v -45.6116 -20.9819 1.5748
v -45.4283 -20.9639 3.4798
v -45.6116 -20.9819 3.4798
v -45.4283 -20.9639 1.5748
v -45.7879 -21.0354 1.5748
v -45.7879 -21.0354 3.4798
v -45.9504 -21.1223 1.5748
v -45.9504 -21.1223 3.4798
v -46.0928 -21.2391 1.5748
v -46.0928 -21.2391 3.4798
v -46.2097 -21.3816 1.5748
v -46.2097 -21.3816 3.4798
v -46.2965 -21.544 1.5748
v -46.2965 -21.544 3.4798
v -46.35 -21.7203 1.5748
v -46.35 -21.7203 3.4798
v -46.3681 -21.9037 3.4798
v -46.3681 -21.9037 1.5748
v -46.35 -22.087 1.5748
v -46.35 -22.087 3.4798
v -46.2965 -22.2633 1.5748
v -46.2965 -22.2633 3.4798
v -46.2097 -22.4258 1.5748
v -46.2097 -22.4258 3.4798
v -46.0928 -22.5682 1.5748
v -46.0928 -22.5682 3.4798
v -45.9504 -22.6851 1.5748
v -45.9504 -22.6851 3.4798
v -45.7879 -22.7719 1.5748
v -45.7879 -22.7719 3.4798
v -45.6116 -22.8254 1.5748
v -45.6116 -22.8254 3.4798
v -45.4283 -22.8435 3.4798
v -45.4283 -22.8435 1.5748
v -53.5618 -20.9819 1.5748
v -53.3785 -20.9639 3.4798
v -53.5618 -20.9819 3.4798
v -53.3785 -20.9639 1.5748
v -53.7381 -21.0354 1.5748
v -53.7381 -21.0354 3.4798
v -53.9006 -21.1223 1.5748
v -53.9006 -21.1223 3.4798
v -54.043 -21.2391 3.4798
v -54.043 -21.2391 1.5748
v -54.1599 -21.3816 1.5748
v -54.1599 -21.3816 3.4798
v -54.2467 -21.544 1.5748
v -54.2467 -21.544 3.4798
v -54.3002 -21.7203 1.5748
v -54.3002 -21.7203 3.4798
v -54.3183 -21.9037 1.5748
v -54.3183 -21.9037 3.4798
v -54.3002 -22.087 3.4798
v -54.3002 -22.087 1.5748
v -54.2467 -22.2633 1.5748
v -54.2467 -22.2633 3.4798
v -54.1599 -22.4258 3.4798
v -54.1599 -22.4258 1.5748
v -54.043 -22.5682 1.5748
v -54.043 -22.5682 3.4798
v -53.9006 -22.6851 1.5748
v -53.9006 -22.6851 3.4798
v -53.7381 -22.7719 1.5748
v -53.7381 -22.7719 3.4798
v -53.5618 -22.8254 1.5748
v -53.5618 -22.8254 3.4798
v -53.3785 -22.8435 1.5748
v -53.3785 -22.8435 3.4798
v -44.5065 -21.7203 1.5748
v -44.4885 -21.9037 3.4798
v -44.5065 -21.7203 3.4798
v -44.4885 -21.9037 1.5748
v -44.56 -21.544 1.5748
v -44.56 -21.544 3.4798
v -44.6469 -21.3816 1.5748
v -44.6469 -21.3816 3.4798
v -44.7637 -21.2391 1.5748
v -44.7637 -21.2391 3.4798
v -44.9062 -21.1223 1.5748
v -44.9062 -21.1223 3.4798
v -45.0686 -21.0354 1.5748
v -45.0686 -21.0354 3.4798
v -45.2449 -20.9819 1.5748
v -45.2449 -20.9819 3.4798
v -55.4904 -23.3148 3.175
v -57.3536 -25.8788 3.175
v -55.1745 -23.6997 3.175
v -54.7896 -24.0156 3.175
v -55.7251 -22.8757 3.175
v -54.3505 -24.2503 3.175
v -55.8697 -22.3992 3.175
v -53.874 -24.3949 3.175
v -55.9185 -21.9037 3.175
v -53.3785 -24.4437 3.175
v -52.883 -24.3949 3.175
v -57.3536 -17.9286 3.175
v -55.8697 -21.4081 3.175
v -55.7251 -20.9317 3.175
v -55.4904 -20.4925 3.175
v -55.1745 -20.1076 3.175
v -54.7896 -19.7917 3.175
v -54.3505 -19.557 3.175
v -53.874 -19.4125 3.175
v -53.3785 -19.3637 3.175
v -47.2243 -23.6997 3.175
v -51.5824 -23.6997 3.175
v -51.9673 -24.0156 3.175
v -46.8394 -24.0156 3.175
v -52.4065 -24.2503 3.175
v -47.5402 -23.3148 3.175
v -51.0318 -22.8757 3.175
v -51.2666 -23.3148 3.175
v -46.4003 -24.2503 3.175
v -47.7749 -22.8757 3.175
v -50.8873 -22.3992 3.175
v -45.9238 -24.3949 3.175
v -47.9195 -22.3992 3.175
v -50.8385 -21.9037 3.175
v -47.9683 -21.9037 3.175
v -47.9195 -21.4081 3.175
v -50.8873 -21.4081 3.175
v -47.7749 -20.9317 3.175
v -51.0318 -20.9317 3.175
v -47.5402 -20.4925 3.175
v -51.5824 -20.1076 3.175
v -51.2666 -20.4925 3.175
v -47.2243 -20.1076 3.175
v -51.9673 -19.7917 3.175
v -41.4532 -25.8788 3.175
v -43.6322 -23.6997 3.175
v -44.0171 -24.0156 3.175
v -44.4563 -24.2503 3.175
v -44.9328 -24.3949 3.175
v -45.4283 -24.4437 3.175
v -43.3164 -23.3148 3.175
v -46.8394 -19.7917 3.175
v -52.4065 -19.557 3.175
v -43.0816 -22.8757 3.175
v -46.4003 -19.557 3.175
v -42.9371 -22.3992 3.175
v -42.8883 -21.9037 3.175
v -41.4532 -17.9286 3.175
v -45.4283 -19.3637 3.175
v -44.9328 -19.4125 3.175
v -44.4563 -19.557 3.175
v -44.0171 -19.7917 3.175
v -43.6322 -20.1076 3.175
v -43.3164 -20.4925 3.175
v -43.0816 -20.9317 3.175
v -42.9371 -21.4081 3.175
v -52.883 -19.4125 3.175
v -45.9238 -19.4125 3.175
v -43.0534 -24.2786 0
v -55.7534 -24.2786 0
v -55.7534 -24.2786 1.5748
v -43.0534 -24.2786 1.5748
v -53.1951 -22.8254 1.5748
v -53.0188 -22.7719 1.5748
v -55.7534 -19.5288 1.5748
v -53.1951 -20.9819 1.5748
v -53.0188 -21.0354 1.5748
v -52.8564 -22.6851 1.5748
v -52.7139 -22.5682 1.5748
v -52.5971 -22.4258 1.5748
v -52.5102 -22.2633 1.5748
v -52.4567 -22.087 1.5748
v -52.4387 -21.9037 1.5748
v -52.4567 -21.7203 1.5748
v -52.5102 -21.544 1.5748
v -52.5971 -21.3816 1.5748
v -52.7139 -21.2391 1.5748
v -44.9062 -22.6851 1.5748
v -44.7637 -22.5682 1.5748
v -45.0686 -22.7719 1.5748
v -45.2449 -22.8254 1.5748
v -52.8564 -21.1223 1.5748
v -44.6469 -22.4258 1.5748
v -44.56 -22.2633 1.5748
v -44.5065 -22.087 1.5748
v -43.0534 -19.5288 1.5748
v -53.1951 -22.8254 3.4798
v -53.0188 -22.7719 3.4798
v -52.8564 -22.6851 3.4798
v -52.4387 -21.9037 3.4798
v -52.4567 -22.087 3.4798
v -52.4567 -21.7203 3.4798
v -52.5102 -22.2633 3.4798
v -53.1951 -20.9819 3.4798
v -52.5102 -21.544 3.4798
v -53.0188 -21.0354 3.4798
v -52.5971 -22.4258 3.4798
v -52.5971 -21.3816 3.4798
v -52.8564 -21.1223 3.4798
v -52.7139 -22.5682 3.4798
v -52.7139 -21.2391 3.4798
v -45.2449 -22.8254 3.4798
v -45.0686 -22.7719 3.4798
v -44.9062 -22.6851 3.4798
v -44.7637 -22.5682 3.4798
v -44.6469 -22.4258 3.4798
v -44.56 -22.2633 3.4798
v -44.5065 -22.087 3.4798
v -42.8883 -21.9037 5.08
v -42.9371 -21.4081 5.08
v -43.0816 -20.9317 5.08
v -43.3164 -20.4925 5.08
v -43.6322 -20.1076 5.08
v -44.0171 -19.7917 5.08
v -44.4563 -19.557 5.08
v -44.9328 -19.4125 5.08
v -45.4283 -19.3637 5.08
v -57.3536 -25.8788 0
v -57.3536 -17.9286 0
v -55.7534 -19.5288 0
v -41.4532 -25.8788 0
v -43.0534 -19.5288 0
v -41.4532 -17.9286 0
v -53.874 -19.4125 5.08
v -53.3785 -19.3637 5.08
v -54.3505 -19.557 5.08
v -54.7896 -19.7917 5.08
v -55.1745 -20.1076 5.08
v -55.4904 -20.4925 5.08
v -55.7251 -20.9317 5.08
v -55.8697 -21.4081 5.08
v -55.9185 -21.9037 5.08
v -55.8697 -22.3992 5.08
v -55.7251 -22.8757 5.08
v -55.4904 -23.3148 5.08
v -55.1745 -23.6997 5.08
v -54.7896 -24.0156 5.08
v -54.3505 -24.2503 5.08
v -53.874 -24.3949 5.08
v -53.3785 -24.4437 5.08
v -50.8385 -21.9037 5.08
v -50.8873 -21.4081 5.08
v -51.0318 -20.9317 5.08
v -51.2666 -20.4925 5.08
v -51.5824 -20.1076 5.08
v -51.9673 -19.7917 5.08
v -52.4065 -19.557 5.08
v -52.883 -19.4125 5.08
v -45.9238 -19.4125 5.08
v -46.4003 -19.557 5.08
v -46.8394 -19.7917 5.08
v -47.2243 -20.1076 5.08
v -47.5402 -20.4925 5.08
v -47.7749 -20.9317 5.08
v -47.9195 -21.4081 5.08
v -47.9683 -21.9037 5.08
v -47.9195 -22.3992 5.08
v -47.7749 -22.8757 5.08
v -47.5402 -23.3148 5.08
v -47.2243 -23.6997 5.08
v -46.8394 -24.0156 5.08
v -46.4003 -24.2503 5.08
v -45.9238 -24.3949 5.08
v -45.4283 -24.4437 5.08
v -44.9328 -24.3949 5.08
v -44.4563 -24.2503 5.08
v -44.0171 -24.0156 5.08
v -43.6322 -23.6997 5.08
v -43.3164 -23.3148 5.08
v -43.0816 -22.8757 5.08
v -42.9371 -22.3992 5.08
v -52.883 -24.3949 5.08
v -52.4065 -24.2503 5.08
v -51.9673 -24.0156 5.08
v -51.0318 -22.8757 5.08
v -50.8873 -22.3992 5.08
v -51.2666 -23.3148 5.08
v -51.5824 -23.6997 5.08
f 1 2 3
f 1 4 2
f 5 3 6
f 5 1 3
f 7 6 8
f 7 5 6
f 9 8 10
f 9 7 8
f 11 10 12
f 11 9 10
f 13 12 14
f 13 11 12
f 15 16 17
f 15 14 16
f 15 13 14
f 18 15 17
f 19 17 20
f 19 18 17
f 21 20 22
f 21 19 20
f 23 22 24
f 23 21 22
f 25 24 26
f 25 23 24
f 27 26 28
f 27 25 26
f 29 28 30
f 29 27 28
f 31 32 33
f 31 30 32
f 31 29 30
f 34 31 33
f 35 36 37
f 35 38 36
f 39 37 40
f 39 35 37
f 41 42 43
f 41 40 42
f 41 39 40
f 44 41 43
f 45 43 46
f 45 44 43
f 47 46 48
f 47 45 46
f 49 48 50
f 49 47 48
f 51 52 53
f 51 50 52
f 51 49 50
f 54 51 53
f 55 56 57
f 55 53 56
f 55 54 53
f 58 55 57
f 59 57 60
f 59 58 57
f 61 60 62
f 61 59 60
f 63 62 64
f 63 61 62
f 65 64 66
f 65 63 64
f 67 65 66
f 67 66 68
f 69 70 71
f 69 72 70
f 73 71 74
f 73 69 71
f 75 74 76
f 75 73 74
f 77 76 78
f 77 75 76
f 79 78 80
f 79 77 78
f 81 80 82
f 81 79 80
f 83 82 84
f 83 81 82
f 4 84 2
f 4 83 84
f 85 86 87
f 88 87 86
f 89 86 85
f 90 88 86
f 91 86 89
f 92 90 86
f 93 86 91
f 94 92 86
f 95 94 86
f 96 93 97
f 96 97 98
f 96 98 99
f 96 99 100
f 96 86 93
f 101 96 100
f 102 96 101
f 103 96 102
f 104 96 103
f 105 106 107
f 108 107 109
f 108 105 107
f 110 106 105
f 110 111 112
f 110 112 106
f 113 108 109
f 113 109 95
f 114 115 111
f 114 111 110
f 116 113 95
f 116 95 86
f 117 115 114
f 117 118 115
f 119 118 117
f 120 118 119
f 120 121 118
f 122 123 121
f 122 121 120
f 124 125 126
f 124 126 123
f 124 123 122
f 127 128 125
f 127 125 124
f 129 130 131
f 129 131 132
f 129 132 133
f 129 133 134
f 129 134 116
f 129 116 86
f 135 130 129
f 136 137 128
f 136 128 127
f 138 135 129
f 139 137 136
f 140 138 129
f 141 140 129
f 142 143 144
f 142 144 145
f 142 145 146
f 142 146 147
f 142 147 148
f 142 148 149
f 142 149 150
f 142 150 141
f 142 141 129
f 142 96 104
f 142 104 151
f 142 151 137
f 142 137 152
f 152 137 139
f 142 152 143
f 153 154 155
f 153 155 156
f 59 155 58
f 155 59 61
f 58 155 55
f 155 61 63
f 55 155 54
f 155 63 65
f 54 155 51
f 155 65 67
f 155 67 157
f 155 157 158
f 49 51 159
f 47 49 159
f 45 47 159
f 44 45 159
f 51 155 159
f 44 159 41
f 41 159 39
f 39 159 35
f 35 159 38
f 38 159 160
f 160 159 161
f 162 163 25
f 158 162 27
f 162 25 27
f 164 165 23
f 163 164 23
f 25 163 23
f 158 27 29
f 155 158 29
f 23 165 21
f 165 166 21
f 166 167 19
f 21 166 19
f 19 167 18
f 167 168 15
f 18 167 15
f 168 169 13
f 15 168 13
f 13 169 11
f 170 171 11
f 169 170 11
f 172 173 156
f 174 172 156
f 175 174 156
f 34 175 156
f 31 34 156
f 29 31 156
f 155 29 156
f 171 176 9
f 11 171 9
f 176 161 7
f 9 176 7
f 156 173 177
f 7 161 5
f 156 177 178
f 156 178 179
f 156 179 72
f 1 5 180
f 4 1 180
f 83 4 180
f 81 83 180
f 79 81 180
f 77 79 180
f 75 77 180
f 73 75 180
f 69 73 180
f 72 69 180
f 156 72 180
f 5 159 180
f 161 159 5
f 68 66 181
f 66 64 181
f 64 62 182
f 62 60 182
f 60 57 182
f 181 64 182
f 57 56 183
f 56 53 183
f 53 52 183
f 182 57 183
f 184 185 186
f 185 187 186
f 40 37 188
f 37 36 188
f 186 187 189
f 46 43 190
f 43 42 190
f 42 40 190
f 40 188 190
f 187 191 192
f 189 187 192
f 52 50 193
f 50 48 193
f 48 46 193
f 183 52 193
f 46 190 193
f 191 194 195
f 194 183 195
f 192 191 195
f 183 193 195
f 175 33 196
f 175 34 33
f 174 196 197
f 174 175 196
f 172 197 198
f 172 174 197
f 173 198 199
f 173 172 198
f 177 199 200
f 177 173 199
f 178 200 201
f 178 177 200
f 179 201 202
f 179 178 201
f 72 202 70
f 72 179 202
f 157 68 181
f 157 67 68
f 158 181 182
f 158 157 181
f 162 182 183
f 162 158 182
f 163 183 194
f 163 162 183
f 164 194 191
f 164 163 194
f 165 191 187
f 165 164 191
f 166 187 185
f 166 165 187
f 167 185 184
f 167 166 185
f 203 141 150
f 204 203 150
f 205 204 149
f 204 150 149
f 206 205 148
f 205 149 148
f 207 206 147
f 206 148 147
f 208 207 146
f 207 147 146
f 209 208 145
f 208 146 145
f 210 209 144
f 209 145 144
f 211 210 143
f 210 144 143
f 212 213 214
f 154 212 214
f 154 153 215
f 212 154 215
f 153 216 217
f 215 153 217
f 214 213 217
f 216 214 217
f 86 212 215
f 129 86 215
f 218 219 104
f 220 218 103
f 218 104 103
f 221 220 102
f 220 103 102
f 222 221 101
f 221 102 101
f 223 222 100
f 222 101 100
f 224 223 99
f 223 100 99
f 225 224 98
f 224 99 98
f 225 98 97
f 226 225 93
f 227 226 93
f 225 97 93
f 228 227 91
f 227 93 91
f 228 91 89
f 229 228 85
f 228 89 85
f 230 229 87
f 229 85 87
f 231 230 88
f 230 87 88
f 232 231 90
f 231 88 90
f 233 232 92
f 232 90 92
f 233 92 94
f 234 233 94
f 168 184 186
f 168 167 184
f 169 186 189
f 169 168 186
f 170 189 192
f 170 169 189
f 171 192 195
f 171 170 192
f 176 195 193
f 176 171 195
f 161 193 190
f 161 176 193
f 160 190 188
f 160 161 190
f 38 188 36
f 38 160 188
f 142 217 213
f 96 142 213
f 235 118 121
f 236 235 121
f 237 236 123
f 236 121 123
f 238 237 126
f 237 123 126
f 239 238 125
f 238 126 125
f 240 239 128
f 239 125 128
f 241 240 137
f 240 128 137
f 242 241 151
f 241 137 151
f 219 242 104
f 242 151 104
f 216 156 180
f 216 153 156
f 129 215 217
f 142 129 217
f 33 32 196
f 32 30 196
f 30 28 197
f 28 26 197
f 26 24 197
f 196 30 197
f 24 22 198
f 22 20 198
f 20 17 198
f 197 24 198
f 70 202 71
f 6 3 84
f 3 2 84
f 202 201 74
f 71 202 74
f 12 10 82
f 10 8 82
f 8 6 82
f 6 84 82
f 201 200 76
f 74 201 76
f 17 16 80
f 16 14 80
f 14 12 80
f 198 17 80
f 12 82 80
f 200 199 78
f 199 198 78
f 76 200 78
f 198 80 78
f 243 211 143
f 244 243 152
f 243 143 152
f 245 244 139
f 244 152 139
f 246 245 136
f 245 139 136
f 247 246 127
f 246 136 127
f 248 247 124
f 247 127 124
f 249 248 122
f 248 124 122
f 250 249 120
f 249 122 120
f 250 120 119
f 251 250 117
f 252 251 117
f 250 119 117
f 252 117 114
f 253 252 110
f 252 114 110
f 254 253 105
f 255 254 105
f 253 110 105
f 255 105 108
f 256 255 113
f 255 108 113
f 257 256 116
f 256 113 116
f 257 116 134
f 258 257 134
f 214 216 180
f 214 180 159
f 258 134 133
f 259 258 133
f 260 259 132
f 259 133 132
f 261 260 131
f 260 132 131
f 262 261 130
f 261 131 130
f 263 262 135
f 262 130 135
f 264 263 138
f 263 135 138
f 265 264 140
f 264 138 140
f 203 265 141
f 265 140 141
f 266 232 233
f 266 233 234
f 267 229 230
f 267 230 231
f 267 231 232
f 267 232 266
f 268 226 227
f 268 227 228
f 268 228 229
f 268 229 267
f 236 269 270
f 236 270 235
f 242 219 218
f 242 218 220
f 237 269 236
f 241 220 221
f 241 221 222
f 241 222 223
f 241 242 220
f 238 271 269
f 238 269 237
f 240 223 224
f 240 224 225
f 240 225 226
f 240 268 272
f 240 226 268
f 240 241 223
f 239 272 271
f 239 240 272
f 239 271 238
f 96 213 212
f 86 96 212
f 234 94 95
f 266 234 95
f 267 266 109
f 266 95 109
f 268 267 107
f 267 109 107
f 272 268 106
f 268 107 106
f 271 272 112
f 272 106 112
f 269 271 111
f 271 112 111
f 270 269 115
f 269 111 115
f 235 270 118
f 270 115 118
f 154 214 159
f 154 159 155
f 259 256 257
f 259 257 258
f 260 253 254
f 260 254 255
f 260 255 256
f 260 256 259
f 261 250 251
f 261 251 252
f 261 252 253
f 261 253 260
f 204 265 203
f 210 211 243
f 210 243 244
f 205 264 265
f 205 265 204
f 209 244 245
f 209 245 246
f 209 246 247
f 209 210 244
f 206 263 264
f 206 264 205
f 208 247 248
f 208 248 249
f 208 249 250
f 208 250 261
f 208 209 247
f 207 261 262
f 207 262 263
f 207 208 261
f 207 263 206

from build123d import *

# Parameters (mm, degrees)
F1_DEPTH = 3.175
F2_DEPTH = 5.08
F3_T     = -1.6002


with BuildPart() as f1:
    # F0 (on Top) → F1 (new body)
    with BuildSketch(Plane.XY):
        with BuildLine():
            Line((-53.3784843279, -17.9285755823), (-57.3535843279, -17.9285755823))
            Line((-57.3535843279, -17.9285755823), (-57.3535843279, -25.8787755823))
            Line((-57.3535843279, -25.8787755823), (-53.3784843279, -25.8787755823))
            Line((-53.3784843279, -25.8787755823), (-53.3784843279, -24.4436755823))
            ThreePointArc((-53.3784843279, -24.4436755823), (-55.9184843279, -21.9036755823), (-53.3784843279, -19.3636755823))
            Line((-53.3784843279, -19.3636755823), (-53.3784843279, -17.9285755823))
        make_face()
        with BuildLine():
            Line((-45.4282843279, -17.9285755823), (-53.3784843279, -17.9285755823))
            Line((-53.3784843279, -17.9285755823), (-53.3784843279, -19.3636755823))
            ThreePointArc((-53.3784843279, -19.3636755823), (-51.5824331037, -20.1076243581), (-50.8384843279, -21.9036755823))
            ThreePointArc((-50.8384843279, -21.9036755823), (-51.5824331037, -23.6997268065), (-53.3784843279, -24.4436755823))
            Line((-53.3784843279, -24.4436755823), (-53.3784843279, -25.8787755823))
            Line((-53.3784843279, -25.8787755823), (-45.4282843279, -25.8787755823))
            Line((-45.4282843279, -25.8787755823), (-45.4282843279, -24.4436755823))
            ThreePointArc((-45.4282843279, -24.4436755823), (-47.9682843279, -21.9036755823), (-45.4282843279, -19.3636755823))
            Line((-45.4282843279, -19.3636755823), (-45.4282843279, -17.9285755823))
        make_face()
        with BuildLine():
            Line((-41.4531843279, -17.9285755823), (-45.4282843279, -17.9285755823))
            Line((-45.4282843279, -17.9285755823), (-45.4282843279, -19.3636755823))
            ThreePointArc((-45.4282843279, -19.3636755823), (-43.6322331037, -20.1076243581), (-42.8882843279, -21.9036755823))
            ThreePointArc((-42.8882843279, -21.9036755823), (-43.6322331037, -23.6997268065), (-45.4282843279, -24.4436755823))
            Line((-45.4282843279, -24.4436755823), (-45.4282843279, -25.8787755823))
            Line((-45.4282843279, -25.8787755823), (-41.4531843279, -25.8787755823))
            Line((-41.4531843279, -25.8787755823), (-41.4531843279, -17.9285755823))
        make_face()
        with BuildLine():
            Line((-45.4282843279, -24.4436755823), (-45.4282843279, -19.3636755823))
            ThreePointArc((-45.4282843279, -19.3636755823), (-47.9682843279, -21.9036755823), (-45.4282843279, -24.4436755823))
        make_face()
        with BuildLine():
            ThreePointArc((-42.8882843279, -21.9036755823), (-43.6322331037, -20.1076243581), (-45.4282843279, -19.3636755823))
            Line((-45.4282843279, -19.3636755823), (-45.4282843279, -24.4436755823))
            ThreePointArc((-45.4282843279, -24.4436755823), (-43.6322331037, -23.6997268065), (-42.8882843279, -21.9036755823))
        make_face()
        with BuildLine():
            ThreePointArc((-50.8384843279, -21.9036755823), (-51.5824331037, -20.1076243581), (-53.3784843279, -19.3636755823))
            Line((-53.3784843279, -19.3636755823), (-53.3784843279, -24.4436755823))
            ThreePointArc((-53.3784843279, -24.4436755823), (-51.5824331037, -23.6997268065), (-50.8384843279, -21.9036755823))
        make_face()
        with BuildLine():
            Line((-53.3784843279, -24.4436755823), (-53.3784843279, -19.3636755823))
            ThreePointArc((-53.3784843279, -19.3636755823), (-55.9184843279, -21.9036755823), (-53.3784843279, -24.4436755823))
        make_face()
    extrude(amount=F1_DEPTH)

    # F0 (on Top) → F2 (join)
    with BuildSketch(Plane.XY):
        with BuildLine():
            Line((-53.3784843279, -24.4436755823), (-53.3784843279, -19.3636755823))
            ThreePointArc((-53.3784843279, -19.3636755823), (-55.9184843279, -21.9036755823), (-53.3784843279, -24.4436755823))
        make_face()
        with BuildLine():
            ThreePointArc((-50.8384843279, -21.9036755823), (-51.5824331037, -20.1076243581), (-53.3784843279, -19.3636755823))
            Line((-53.3784843279, -19.3636755823), (-53.3784843279, -24.4436755823))
            ThreePointArc((-53.3784843279, -24.4436755823), (-51.5824331037, -23.6997268065), (-50.8384843279, -21.9036755823))
        make_face()
        with BuildLine():
            Line((-45.4282843279, -24.4436755823), (-45.4282843279, -19.3636755823))
            ThreePointArc((-45.4282843279, -19.3636755823), (-47.9682843279, -21.9036755823), (-45.4282843279, -24.4436755823))
        make_face()
        with BuildLine():
            ThreePointArc((-42.8882843279, -21.9036755823), (-43.6322331037, -20.1076243581), (-45.4282843279, -19.3636755823))
            Line((-45.4282843279, -19.3636755823), (-45.4282843279, -24.4436755823))
            ThreePointArc((-45.4282843279, -24.4436755823), (-43.6322331037, -23.6997268065), (-42.8882843279, -21.9036755823))
        make_face()
    extrude(amount=F2_DEPTH)

    # F3
    f3_openings = [f1.faces().sort_by_distance(p)[0] for p in [
        (-49.403384, -21.903676, 0),
    ]]
    offset(amount=F3_T, openings=f3_openings, kind=Kind.INTERSECTION)


solid = f1.part
